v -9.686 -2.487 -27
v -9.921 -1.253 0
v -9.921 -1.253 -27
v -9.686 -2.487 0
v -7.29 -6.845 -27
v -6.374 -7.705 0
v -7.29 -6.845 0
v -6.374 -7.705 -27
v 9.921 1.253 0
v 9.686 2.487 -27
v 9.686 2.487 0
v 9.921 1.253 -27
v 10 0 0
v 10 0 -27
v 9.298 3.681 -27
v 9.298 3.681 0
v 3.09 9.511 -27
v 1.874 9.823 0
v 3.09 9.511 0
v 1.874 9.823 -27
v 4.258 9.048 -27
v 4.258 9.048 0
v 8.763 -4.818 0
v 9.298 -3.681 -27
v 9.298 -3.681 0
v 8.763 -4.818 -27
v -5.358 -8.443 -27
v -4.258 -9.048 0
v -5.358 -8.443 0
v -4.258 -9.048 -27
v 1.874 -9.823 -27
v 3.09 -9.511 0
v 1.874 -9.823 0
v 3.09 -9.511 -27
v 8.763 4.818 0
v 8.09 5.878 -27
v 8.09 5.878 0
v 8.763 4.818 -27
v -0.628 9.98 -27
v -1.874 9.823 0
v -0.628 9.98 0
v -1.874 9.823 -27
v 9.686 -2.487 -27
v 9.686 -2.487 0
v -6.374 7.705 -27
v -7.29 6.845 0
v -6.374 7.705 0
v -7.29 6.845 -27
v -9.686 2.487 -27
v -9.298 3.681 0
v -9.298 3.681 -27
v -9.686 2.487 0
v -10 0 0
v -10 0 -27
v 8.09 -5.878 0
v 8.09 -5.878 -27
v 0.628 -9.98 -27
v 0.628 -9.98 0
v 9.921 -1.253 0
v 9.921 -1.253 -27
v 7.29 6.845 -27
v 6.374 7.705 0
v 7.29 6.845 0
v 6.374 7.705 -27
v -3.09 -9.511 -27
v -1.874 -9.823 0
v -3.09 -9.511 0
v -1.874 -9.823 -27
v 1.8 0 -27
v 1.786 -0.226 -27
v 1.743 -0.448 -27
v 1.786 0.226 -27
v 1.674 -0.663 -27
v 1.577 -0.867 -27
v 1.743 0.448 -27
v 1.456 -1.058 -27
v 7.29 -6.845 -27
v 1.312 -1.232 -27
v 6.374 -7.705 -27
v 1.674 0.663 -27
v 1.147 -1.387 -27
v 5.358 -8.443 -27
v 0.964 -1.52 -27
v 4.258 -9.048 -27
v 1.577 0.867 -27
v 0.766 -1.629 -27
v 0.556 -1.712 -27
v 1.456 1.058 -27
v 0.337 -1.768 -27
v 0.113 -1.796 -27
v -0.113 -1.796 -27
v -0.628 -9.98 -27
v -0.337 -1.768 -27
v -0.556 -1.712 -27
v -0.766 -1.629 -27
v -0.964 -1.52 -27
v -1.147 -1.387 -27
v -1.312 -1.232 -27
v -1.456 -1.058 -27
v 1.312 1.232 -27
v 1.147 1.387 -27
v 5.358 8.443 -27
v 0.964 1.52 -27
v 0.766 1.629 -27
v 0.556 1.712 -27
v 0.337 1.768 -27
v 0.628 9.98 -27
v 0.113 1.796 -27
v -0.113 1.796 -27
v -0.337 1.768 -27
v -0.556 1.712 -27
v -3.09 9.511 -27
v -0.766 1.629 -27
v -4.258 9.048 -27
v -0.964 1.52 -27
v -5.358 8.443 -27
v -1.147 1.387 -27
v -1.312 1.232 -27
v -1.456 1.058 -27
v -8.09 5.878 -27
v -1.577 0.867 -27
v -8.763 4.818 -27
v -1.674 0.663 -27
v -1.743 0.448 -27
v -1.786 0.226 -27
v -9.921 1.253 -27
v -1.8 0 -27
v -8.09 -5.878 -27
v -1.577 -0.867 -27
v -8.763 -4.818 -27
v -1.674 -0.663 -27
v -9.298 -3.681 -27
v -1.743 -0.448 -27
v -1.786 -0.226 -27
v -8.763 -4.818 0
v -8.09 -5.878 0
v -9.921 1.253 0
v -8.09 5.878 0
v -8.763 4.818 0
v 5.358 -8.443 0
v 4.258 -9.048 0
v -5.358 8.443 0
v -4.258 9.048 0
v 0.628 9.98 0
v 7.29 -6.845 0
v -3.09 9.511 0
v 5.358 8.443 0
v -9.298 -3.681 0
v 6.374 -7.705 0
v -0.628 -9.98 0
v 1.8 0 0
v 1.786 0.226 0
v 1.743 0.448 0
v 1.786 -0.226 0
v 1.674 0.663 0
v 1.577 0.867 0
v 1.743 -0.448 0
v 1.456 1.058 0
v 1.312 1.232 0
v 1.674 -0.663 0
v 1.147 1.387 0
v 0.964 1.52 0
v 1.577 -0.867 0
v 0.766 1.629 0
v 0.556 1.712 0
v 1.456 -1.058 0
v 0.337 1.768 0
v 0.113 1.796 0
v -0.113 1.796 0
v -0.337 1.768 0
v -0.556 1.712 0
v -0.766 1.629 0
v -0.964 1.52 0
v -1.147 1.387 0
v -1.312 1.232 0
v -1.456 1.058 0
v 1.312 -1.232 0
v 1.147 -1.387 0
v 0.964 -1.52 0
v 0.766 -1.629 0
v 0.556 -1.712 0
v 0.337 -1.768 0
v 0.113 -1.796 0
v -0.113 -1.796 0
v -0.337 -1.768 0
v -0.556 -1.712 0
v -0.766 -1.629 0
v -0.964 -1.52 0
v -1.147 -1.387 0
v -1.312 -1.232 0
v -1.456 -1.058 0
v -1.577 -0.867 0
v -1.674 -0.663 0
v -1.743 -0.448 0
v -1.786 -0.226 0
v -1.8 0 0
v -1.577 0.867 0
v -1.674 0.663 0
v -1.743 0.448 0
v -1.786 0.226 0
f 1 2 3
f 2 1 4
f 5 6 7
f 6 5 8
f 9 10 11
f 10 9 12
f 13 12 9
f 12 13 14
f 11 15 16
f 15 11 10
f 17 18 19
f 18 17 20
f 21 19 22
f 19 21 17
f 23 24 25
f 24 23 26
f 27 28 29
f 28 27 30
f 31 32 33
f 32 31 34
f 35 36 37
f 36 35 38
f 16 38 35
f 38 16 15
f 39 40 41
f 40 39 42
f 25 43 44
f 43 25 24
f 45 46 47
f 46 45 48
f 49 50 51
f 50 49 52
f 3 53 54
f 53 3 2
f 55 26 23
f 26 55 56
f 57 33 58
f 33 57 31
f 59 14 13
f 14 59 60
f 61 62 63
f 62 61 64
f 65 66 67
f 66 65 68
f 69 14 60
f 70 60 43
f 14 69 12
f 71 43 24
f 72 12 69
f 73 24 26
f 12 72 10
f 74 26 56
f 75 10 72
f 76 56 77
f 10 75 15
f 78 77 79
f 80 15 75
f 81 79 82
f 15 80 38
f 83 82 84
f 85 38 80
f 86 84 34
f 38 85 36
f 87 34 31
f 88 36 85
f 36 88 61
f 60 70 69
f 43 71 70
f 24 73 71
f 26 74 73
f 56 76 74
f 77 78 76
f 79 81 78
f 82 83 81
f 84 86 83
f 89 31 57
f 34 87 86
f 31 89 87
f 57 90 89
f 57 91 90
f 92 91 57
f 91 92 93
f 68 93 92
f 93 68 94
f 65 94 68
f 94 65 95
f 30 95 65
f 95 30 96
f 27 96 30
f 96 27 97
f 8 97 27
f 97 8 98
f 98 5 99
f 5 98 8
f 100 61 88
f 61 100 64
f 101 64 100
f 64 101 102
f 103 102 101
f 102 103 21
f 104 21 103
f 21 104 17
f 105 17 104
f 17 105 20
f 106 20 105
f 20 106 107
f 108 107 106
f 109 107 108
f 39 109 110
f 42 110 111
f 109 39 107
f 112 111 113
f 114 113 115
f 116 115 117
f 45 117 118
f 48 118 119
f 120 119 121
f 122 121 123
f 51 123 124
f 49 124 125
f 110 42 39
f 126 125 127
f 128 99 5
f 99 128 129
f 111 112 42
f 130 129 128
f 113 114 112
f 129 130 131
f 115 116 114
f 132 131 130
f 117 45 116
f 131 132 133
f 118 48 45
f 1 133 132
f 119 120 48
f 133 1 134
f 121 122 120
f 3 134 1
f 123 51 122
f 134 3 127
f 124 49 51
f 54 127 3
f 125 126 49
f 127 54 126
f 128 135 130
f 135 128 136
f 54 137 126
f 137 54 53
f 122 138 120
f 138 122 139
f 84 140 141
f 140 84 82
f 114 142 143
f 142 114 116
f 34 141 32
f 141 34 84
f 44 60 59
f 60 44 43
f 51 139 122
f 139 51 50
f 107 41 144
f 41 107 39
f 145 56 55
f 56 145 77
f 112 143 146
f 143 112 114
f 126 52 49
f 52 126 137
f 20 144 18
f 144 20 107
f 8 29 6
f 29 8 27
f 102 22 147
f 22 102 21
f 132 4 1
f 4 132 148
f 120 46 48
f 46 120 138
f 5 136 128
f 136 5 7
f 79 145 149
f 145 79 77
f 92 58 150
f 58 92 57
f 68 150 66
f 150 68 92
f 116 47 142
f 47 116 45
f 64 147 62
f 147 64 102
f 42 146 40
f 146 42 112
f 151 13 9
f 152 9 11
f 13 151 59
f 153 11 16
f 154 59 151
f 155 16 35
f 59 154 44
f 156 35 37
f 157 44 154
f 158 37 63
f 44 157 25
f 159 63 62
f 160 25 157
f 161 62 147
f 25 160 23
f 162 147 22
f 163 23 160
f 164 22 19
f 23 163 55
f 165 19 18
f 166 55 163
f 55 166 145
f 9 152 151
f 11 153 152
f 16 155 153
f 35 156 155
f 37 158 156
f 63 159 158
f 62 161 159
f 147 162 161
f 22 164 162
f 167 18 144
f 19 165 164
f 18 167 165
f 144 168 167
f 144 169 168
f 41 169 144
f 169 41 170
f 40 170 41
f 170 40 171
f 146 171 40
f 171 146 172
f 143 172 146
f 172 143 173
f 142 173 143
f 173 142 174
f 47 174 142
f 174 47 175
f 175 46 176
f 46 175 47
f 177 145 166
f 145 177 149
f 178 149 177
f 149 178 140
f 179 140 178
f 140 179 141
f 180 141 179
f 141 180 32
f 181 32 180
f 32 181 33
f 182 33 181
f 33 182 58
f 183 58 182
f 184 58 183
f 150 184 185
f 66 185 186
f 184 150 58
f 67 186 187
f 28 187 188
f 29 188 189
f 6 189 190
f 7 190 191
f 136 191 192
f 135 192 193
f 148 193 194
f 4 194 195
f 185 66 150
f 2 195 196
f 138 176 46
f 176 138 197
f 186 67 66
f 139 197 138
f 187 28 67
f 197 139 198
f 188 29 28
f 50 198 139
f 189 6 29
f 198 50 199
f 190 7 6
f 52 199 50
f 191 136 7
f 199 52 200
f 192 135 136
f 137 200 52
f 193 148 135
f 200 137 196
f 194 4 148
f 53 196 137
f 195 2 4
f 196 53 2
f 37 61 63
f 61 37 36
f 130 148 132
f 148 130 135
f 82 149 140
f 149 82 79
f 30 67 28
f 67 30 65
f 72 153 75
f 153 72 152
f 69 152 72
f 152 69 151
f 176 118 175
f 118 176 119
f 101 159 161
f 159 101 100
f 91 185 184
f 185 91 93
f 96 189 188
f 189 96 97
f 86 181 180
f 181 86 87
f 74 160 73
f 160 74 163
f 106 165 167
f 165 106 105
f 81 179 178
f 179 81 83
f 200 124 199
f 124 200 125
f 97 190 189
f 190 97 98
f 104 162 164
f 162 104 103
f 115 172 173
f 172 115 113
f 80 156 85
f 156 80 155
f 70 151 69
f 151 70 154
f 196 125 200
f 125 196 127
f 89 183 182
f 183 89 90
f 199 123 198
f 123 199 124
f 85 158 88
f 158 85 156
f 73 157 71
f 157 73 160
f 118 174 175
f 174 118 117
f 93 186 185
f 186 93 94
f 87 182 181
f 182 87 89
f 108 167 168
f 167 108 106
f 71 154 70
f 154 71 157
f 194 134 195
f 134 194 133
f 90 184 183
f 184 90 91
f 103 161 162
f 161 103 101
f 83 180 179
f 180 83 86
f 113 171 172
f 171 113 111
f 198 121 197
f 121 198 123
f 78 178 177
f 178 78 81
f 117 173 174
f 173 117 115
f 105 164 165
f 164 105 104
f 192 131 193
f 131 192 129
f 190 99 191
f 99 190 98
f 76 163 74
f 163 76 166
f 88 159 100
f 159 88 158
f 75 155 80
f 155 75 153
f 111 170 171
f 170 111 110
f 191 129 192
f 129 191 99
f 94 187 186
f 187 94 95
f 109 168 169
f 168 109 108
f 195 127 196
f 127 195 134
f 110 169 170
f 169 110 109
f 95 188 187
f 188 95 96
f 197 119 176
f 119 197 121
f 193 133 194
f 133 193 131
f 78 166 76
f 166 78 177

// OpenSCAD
$fn = 50;


difference() {
	union() {
		translate(v = [0, 0, -27.0000000000]) {
			cylinder(h = 27, r = 10.0000000000);
		}
	}
	union() {
		#translate(v = [0, 0, -27]) {
			cylinder(h = 27, r = 1.8000000000);
		}
	}
}
